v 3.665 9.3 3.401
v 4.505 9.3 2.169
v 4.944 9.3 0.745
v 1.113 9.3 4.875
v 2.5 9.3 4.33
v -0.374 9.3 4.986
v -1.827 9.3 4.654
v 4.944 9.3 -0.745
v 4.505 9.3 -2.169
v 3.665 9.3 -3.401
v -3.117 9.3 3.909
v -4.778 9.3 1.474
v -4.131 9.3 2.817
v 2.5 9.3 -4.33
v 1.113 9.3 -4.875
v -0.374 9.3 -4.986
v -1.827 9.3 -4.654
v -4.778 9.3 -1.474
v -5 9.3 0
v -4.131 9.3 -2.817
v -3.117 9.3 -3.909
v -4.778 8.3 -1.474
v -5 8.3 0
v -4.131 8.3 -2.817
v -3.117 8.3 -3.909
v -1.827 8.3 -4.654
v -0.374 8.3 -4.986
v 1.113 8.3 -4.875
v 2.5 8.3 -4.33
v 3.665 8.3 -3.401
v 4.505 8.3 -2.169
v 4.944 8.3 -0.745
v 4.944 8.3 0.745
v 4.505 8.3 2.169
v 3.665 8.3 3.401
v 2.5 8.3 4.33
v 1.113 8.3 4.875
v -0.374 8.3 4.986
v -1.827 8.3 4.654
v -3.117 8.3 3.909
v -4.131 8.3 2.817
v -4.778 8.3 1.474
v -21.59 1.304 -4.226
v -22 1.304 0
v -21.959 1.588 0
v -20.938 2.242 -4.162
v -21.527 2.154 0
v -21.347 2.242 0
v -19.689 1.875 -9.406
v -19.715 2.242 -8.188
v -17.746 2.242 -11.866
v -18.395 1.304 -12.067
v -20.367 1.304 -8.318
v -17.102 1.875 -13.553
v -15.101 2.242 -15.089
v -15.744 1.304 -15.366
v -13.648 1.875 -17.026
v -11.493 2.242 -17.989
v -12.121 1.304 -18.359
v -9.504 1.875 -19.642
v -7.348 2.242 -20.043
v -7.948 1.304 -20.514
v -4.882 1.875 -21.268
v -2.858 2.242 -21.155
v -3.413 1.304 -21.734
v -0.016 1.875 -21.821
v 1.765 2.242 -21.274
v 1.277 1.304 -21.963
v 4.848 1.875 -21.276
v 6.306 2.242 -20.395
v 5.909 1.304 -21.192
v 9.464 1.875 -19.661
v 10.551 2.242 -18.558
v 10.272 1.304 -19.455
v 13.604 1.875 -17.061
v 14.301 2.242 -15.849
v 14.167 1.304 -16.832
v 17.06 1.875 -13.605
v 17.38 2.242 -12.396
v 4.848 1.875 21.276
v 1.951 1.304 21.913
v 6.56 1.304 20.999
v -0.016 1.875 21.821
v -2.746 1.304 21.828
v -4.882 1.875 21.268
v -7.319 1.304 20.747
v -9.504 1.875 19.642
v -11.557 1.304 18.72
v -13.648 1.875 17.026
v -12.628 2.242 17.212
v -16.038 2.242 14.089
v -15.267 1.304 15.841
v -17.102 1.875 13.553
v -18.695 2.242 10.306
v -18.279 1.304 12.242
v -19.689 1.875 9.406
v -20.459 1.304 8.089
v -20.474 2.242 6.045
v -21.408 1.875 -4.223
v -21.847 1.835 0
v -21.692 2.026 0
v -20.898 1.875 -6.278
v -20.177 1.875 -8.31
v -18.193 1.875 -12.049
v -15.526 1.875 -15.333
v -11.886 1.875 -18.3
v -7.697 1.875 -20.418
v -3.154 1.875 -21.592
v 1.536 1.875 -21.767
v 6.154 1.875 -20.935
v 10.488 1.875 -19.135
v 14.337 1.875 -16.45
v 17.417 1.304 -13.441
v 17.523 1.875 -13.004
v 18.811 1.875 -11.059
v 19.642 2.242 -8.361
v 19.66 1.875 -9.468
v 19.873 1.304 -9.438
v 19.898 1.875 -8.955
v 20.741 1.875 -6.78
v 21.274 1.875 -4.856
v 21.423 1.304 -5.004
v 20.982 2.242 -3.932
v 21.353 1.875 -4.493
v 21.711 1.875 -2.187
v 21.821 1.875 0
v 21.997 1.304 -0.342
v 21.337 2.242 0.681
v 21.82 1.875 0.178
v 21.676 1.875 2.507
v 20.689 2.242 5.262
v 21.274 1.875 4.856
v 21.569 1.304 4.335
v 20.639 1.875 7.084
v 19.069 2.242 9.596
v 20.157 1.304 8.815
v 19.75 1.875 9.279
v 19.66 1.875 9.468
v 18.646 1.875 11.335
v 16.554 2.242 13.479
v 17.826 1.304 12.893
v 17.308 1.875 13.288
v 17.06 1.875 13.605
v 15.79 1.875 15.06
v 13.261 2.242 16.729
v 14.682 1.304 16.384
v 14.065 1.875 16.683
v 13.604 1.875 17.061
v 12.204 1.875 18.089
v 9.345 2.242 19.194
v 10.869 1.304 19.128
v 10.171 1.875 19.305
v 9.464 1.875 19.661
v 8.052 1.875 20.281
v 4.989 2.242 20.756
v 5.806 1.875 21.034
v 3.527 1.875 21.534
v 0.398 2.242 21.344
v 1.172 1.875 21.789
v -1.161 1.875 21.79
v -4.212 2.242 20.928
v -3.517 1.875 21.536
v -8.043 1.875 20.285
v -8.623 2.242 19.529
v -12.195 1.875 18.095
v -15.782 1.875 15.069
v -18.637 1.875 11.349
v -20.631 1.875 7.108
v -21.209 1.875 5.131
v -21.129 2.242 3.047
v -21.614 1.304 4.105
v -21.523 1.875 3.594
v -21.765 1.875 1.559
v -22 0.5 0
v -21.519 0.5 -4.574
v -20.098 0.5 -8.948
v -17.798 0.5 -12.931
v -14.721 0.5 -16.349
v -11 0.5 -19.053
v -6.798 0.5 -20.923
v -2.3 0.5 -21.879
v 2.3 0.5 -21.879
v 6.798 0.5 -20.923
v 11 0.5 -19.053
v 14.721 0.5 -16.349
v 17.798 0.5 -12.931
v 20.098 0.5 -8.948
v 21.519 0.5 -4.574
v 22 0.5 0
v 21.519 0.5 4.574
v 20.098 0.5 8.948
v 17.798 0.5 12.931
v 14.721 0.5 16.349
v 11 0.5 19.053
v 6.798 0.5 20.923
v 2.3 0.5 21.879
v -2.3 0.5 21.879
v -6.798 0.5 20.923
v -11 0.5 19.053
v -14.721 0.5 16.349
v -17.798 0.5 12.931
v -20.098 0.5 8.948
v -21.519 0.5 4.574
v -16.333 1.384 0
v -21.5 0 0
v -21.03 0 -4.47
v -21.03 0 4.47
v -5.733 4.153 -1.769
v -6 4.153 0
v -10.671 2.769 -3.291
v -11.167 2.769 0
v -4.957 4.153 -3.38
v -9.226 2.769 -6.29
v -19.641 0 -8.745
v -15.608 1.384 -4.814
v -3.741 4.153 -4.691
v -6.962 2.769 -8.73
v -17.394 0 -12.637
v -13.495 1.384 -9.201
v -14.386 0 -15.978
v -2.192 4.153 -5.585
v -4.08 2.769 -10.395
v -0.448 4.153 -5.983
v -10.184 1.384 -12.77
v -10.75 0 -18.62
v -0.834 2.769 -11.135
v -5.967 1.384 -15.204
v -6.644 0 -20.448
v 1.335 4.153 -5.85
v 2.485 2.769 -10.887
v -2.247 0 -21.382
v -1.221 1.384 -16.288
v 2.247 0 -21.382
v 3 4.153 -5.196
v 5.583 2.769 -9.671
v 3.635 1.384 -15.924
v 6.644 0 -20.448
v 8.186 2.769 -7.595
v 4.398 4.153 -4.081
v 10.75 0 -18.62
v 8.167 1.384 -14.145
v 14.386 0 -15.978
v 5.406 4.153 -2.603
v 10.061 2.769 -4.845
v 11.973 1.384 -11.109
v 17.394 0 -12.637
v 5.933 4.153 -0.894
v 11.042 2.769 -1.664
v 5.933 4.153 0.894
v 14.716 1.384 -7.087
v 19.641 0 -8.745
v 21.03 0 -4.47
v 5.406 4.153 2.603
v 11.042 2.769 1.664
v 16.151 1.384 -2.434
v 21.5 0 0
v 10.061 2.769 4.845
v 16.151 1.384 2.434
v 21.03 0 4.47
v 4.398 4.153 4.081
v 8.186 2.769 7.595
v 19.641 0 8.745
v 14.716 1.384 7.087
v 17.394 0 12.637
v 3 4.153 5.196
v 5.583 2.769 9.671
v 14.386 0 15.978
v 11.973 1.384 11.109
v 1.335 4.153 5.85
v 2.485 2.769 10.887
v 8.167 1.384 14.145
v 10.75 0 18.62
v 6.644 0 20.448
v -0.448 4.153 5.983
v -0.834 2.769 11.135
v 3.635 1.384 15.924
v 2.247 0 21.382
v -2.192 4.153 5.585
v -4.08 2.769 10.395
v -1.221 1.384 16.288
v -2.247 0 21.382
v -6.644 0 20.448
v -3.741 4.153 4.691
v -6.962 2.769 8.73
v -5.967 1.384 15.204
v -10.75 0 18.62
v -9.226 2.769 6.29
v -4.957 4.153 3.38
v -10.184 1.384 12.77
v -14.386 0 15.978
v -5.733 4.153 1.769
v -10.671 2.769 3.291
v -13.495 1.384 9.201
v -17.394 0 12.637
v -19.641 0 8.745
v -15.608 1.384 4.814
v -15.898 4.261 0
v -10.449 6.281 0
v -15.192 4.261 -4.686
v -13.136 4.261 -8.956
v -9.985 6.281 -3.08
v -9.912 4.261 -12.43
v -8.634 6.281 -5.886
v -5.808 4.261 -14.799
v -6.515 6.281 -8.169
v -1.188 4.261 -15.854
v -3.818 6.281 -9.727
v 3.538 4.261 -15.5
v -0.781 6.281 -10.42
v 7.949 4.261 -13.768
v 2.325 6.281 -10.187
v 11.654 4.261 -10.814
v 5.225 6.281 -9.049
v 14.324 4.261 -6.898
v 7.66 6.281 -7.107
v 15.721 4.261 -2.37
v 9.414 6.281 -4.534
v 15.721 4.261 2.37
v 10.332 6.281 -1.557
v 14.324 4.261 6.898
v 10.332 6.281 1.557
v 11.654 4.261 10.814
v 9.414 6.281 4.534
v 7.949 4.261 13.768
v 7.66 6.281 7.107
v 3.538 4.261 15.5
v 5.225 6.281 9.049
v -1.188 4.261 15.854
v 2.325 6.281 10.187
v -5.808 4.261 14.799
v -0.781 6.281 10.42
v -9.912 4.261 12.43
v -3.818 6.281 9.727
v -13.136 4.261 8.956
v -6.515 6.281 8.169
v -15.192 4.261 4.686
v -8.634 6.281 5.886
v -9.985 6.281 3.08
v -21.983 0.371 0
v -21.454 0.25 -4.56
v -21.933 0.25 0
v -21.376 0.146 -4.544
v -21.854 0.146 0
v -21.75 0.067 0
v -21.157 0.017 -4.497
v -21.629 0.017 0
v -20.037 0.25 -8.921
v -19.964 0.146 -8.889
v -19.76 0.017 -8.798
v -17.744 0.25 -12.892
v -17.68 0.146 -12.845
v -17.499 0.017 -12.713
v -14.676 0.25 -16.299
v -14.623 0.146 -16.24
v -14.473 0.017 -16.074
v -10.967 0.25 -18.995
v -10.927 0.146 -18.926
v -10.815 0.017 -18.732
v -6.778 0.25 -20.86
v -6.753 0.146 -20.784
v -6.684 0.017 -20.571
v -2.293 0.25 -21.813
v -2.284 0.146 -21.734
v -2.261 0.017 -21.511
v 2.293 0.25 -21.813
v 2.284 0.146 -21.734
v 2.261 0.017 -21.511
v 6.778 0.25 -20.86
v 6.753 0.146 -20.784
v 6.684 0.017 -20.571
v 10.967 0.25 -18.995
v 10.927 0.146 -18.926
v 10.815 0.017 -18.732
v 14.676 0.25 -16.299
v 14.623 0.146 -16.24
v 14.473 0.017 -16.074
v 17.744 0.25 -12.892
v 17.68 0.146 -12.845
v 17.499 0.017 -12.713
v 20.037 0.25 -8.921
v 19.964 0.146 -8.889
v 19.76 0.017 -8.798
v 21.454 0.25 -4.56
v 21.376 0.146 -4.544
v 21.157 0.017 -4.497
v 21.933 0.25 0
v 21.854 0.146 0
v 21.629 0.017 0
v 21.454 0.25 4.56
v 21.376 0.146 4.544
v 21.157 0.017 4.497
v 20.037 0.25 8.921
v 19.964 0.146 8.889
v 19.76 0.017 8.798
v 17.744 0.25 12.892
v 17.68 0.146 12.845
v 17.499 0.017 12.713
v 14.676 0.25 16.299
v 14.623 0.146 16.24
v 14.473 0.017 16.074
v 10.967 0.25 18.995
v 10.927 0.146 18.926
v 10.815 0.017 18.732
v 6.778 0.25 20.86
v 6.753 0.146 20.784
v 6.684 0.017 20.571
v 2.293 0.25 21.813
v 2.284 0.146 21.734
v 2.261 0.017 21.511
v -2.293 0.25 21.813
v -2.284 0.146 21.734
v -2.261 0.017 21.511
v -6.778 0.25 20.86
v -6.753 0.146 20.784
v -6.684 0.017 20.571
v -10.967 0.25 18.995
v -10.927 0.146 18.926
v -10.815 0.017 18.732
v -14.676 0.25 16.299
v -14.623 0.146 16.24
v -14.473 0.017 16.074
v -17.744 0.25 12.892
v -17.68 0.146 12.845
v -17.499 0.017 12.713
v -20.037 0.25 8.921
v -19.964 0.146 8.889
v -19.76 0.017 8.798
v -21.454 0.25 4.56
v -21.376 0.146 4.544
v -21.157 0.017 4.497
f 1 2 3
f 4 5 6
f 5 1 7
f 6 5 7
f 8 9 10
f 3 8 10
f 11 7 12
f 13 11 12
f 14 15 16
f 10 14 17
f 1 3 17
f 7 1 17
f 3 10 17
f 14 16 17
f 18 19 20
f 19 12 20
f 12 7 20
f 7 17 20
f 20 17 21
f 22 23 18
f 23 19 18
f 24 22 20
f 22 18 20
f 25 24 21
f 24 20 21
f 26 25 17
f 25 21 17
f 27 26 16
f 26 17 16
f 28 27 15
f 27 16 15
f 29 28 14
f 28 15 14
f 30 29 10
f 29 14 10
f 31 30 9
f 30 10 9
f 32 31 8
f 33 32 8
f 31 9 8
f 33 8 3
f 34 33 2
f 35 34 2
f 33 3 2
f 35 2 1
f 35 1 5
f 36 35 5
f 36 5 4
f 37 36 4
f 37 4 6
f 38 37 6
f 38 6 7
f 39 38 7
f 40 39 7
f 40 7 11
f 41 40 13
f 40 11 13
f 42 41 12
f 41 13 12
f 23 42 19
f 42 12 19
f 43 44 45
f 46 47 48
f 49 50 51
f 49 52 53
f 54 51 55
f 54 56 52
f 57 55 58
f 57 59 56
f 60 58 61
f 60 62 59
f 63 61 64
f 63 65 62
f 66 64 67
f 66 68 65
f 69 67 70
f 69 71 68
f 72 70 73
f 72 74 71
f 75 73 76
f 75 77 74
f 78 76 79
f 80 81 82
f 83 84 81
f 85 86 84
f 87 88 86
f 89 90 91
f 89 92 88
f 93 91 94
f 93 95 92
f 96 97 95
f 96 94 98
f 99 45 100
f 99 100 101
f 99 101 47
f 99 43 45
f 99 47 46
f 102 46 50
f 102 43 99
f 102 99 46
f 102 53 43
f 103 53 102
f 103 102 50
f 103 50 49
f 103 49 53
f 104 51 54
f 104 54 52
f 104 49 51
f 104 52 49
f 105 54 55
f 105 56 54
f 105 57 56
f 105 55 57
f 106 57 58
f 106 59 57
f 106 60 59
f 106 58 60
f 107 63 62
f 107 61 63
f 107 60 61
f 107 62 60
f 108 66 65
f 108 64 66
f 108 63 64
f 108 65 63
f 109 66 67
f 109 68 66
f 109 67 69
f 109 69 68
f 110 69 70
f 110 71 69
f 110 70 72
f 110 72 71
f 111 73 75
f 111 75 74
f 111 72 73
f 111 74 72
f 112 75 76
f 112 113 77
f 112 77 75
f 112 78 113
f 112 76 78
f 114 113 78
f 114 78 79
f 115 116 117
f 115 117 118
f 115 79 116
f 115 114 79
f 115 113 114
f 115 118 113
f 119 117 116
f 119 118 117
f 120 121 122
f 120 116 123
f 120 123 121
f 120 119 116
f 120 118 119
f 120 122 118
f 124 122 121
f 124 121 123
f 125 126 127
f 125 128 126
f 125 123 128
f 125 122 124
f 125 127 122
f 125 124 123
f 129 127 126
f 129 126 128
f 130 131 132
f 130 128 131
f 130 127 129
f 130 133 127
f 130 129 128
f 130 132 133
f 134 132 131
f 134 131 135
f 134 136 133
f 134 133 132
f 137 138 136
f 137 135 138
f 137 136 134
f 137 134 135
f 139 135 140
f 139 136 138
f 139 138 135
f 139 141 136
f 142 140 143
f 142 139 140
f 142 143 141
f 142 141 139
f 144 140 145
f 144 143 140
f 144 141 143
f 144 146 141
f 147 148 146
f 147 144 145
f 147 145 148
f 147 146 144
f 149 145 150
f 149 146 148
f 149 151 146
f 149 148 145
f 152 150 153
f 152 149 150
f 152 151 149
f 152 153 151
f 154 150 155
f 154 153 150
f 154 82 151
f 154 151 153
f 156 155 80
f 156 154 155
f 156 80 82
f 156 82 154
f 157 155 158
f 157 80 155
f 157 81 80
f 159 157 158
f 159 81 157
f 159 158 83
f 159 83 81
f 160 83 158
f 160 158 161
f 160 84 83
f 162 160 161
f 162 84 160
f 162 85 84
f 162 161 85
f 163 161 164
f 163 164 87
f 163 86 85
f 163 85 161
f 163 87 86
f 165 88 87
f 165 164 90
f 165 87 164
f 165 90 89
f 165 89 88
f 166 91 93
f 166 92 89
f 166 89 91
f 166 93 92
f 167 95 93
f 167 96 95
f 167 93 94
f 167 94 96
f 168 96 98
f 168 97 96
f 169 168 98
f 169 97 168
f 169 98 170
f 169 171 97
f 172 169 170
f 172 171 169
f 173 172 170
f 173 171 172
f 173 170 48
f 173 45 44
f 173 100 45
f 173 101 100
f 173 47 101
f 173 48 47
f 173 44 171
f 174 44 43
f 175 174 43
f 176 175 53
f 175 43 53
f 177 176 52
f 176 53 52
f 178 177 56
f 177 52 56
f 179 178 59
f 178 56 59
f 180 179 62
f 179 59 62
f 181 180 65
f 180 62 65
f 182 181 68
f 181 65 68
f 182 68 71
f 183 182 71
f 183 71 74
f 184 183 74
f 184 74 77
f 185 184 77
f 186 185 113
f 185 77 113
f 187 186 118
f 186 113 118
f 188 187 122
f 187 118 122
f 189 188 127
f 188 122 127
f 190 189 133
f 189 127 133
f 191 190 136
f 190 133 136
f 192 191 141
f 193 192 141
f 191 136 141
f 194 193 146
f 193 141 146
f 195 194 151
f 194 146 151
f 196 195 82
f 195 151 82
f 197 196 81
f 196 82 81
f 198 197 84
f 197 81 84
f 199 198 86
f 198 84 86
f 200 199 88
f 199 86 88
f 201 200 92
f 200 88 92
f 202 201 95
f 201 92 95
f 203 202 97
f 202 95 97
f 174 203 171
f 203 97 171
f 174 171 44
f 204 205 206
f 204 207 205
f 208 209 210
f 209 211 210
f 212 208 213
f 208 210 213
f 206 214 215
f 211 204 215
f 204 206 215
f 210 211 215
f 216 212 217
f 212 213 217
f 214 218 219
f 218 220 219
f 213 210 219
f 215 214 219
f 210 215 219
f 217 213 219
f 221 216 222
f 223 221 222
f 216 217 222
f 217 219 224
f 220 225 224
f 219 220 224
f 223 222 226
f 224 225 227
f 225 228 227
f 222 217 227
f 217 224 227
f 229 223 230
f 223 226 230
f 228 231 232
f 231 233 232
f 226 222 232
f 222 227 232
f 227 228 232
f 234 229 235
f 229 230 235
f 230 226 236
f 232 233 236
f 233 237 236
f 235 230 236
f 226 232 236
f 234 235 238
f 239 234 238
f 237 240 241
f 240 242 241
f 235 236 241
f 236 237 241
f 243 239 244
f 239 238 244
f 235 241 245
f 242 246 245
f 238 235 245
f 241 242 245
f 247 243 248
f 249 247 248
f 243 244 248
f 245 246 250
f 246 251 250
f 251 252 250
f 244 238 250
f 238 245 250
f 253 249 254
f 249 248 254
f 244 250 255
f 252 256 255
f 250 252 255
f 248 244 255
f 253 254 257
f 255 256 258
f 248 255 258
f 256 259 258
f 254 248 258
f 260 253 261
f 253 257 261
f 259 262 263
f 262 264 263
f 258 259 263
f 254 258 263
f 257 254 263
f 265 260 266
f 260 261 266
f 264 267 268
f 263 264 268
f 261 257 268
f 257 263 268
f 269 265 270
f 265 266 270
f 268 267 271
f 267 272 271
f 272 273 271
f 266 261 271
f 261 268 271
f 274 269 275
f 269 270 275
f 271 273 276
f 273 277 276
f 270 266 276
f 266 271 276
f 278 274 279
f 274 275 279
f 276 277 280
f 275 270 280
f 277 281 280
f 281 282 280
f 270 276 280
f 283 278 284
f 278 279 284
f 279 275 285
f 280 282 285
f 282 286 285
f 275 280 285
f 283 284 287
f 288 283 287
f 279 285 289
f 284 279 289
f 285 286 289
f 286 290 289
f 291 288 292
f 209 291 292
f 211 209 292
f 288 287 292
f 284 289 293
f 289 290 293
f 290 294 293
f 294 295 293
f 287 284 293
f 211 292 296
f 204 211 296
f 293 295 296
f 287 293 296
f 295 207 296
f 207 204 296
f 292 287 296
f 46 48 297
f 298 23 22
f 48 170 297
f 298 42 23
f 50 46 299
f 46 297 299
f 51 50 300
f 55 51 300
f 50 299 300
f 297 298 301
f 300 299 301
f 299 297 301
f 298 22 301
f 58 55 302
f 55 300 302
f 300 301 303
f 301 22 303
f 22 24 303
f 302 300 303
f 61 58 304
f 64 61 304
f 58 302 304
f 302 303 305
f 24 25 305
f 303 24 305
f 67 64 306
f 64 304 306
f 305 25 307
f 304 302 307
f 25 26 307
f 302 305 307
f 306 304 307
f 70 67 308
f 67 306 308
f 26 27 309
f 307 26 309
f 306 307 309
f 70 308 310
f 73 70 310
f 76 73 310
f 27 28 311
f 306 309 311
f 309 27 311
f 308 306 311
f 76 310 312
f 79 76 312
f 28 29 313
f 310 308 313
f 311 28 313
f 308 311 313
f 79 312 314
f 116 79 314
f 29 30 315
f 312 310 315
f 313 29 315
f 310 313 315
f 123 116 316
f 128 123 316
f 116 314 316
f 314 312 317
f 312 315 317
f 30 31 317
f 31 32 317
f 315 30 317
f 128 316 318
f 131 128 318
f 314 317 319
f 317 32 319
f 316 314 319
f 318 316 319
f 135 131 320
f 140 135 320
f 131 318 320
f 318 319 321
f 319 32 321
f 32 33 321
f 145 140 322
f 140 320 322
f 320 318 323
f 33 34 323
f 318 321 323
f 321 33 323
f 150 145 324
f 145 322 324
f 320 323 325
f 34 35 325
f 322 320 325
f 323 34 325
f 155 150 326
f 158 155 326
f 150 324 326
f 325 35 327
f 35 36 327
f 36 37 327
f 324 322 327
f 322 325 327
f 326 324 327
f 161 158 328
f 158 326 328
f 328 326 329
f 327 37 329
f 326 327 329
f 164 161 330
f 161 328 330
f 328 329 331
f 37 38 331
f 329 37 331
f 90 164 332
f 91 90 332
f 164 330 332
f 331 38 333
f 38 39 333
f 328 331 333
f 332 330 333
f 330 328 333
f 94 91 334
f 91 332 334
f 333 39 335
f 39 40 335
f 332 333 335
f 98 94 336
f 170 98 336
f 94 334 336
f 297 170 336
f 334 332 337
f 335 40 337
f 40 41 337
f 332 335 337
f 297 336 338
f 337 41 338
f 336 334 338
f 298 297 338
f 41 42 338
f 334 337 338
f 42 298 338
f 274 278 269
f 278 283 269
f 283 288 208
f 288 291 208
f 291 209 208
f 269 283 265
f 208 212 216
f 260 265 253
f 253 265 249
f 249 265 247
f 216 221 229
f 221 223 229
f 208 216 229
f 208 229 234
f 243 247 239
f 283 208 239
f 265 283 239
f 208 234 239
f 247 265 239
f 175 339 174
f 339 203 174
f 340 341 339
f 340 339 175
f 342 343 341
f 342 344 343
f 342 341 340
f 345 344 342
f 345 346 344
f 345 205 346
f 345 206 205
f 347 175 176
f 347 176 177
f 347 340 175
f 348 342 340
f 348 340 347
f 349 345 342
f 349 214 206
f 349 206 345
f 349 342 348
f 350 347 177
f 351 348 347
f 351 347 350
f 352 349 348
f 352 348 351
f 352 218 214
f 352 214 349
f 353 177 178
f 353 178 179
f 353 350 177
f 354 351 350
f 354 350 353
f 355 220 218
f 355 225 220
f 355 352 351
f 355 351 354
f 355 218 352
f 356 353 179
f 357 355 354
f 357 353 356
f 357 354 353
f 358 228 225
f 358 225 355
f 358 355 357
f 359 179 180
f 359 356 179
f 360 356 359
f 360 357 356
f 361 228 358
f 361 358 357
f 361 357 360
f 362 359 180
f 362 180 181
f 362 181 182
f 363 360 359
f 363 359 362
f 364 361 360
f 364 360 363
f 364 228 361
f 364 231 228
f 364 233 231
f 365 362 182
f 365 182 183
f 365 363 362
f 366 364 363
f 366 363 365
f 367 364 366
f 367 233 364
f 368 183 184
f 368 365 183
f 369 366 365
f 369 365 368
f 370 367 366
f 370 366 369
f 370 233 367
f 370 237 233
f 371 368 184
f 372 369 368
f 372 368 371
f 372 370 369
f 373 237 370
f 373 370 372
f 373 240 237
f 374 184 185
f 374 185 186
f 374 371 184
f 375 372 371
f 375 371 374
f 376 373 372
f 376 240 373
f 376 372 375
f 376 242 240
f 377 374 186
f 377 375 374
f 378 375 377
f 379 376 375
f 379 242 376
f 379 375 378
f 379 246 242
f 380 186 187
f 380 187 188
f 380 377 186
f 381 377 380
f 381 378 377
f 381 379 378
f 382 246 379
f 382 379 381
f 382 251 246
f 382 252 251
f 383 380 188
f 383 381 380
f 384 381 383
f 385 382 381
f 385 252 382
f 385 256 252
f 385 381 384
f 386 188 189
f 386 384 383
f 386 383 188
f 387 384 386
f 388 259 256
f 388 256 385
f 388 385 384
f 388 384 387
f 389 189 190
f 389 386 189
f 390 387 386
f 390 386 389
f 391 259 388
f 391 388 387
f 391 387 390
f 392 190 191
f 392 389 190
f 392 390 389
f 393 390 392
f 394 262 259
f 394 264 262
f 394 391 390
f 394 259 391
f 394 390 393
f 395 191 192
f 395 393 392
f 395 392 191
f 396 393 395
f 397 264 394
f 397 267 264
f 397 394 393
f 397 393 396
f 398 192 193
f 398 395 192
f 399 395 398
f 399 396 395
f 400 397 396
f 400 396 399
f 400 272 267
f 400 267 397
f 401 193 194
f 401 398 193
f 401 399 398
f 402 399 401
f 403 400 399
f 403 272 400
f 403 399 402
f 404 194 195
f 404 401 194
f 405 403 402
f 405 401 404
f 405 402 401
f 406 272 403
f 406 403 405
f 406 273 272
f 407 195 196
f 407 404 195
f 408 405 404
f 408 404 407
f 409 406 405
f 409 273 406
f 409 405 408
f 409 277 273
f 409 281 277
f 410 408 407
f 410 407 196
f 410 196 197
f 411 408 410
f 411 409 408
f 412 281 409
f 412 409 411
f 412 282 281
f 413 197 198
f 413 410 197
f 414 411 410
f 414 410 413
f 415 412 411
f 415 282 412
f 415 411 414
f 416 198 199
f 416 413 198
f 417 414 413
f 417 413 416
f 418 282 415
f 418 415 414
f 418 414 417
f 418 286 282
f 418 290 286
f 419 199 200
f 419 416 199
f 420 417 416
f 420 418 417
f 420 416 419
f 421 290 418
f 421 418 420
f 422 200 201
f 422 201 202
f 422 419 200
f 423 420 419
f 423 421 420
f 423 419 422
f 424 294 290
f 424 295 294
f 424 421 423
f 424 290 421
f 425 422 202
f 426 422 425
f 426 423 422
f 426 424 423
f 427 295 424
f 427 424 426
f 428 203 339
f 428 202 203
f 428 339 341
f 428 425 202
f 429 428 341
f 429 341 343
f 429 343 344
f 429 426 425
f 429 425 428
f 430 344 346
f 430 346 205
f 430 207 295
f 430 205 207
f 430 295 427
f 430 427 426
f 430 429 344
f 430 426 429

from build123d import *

# Parameters (mm, degrees)
FILLET1_R = 1
FILLET2_R = 0.5


with BuildPart() as part:
    # Sketch1 → Revolve1 (revolve)
    with BuildSketch(Plane.XY):
        Polygon((-6, 4.153212483), (-21.5, 0), (-22, 0), (-22, 2), (-5, 8.3), (-5, 9.3), (0, 9.3), (0, 4.153212483), align=None)
    revolve(axis=Axis((0, 57.053571429, 0), (0, -1, 0)))

    # Fillet1
    fillet1_edges = [part.edges().sort_by_distance(p)[0] for p in [
        (22, 2, 0),
    ]]
    fillet(fillet1_edges, radius=FILLET1_R)

    # Fillet2
    fillet2_edges = [part.edges().sort_by_distance(p)[0] for p in [
        (22, 0, 0),
    ]]
    fillet(fillet2_edges, radius=FILLET2_R - 0.0001)  # a hair under: the kernel refuses the full size


solid = part.part
